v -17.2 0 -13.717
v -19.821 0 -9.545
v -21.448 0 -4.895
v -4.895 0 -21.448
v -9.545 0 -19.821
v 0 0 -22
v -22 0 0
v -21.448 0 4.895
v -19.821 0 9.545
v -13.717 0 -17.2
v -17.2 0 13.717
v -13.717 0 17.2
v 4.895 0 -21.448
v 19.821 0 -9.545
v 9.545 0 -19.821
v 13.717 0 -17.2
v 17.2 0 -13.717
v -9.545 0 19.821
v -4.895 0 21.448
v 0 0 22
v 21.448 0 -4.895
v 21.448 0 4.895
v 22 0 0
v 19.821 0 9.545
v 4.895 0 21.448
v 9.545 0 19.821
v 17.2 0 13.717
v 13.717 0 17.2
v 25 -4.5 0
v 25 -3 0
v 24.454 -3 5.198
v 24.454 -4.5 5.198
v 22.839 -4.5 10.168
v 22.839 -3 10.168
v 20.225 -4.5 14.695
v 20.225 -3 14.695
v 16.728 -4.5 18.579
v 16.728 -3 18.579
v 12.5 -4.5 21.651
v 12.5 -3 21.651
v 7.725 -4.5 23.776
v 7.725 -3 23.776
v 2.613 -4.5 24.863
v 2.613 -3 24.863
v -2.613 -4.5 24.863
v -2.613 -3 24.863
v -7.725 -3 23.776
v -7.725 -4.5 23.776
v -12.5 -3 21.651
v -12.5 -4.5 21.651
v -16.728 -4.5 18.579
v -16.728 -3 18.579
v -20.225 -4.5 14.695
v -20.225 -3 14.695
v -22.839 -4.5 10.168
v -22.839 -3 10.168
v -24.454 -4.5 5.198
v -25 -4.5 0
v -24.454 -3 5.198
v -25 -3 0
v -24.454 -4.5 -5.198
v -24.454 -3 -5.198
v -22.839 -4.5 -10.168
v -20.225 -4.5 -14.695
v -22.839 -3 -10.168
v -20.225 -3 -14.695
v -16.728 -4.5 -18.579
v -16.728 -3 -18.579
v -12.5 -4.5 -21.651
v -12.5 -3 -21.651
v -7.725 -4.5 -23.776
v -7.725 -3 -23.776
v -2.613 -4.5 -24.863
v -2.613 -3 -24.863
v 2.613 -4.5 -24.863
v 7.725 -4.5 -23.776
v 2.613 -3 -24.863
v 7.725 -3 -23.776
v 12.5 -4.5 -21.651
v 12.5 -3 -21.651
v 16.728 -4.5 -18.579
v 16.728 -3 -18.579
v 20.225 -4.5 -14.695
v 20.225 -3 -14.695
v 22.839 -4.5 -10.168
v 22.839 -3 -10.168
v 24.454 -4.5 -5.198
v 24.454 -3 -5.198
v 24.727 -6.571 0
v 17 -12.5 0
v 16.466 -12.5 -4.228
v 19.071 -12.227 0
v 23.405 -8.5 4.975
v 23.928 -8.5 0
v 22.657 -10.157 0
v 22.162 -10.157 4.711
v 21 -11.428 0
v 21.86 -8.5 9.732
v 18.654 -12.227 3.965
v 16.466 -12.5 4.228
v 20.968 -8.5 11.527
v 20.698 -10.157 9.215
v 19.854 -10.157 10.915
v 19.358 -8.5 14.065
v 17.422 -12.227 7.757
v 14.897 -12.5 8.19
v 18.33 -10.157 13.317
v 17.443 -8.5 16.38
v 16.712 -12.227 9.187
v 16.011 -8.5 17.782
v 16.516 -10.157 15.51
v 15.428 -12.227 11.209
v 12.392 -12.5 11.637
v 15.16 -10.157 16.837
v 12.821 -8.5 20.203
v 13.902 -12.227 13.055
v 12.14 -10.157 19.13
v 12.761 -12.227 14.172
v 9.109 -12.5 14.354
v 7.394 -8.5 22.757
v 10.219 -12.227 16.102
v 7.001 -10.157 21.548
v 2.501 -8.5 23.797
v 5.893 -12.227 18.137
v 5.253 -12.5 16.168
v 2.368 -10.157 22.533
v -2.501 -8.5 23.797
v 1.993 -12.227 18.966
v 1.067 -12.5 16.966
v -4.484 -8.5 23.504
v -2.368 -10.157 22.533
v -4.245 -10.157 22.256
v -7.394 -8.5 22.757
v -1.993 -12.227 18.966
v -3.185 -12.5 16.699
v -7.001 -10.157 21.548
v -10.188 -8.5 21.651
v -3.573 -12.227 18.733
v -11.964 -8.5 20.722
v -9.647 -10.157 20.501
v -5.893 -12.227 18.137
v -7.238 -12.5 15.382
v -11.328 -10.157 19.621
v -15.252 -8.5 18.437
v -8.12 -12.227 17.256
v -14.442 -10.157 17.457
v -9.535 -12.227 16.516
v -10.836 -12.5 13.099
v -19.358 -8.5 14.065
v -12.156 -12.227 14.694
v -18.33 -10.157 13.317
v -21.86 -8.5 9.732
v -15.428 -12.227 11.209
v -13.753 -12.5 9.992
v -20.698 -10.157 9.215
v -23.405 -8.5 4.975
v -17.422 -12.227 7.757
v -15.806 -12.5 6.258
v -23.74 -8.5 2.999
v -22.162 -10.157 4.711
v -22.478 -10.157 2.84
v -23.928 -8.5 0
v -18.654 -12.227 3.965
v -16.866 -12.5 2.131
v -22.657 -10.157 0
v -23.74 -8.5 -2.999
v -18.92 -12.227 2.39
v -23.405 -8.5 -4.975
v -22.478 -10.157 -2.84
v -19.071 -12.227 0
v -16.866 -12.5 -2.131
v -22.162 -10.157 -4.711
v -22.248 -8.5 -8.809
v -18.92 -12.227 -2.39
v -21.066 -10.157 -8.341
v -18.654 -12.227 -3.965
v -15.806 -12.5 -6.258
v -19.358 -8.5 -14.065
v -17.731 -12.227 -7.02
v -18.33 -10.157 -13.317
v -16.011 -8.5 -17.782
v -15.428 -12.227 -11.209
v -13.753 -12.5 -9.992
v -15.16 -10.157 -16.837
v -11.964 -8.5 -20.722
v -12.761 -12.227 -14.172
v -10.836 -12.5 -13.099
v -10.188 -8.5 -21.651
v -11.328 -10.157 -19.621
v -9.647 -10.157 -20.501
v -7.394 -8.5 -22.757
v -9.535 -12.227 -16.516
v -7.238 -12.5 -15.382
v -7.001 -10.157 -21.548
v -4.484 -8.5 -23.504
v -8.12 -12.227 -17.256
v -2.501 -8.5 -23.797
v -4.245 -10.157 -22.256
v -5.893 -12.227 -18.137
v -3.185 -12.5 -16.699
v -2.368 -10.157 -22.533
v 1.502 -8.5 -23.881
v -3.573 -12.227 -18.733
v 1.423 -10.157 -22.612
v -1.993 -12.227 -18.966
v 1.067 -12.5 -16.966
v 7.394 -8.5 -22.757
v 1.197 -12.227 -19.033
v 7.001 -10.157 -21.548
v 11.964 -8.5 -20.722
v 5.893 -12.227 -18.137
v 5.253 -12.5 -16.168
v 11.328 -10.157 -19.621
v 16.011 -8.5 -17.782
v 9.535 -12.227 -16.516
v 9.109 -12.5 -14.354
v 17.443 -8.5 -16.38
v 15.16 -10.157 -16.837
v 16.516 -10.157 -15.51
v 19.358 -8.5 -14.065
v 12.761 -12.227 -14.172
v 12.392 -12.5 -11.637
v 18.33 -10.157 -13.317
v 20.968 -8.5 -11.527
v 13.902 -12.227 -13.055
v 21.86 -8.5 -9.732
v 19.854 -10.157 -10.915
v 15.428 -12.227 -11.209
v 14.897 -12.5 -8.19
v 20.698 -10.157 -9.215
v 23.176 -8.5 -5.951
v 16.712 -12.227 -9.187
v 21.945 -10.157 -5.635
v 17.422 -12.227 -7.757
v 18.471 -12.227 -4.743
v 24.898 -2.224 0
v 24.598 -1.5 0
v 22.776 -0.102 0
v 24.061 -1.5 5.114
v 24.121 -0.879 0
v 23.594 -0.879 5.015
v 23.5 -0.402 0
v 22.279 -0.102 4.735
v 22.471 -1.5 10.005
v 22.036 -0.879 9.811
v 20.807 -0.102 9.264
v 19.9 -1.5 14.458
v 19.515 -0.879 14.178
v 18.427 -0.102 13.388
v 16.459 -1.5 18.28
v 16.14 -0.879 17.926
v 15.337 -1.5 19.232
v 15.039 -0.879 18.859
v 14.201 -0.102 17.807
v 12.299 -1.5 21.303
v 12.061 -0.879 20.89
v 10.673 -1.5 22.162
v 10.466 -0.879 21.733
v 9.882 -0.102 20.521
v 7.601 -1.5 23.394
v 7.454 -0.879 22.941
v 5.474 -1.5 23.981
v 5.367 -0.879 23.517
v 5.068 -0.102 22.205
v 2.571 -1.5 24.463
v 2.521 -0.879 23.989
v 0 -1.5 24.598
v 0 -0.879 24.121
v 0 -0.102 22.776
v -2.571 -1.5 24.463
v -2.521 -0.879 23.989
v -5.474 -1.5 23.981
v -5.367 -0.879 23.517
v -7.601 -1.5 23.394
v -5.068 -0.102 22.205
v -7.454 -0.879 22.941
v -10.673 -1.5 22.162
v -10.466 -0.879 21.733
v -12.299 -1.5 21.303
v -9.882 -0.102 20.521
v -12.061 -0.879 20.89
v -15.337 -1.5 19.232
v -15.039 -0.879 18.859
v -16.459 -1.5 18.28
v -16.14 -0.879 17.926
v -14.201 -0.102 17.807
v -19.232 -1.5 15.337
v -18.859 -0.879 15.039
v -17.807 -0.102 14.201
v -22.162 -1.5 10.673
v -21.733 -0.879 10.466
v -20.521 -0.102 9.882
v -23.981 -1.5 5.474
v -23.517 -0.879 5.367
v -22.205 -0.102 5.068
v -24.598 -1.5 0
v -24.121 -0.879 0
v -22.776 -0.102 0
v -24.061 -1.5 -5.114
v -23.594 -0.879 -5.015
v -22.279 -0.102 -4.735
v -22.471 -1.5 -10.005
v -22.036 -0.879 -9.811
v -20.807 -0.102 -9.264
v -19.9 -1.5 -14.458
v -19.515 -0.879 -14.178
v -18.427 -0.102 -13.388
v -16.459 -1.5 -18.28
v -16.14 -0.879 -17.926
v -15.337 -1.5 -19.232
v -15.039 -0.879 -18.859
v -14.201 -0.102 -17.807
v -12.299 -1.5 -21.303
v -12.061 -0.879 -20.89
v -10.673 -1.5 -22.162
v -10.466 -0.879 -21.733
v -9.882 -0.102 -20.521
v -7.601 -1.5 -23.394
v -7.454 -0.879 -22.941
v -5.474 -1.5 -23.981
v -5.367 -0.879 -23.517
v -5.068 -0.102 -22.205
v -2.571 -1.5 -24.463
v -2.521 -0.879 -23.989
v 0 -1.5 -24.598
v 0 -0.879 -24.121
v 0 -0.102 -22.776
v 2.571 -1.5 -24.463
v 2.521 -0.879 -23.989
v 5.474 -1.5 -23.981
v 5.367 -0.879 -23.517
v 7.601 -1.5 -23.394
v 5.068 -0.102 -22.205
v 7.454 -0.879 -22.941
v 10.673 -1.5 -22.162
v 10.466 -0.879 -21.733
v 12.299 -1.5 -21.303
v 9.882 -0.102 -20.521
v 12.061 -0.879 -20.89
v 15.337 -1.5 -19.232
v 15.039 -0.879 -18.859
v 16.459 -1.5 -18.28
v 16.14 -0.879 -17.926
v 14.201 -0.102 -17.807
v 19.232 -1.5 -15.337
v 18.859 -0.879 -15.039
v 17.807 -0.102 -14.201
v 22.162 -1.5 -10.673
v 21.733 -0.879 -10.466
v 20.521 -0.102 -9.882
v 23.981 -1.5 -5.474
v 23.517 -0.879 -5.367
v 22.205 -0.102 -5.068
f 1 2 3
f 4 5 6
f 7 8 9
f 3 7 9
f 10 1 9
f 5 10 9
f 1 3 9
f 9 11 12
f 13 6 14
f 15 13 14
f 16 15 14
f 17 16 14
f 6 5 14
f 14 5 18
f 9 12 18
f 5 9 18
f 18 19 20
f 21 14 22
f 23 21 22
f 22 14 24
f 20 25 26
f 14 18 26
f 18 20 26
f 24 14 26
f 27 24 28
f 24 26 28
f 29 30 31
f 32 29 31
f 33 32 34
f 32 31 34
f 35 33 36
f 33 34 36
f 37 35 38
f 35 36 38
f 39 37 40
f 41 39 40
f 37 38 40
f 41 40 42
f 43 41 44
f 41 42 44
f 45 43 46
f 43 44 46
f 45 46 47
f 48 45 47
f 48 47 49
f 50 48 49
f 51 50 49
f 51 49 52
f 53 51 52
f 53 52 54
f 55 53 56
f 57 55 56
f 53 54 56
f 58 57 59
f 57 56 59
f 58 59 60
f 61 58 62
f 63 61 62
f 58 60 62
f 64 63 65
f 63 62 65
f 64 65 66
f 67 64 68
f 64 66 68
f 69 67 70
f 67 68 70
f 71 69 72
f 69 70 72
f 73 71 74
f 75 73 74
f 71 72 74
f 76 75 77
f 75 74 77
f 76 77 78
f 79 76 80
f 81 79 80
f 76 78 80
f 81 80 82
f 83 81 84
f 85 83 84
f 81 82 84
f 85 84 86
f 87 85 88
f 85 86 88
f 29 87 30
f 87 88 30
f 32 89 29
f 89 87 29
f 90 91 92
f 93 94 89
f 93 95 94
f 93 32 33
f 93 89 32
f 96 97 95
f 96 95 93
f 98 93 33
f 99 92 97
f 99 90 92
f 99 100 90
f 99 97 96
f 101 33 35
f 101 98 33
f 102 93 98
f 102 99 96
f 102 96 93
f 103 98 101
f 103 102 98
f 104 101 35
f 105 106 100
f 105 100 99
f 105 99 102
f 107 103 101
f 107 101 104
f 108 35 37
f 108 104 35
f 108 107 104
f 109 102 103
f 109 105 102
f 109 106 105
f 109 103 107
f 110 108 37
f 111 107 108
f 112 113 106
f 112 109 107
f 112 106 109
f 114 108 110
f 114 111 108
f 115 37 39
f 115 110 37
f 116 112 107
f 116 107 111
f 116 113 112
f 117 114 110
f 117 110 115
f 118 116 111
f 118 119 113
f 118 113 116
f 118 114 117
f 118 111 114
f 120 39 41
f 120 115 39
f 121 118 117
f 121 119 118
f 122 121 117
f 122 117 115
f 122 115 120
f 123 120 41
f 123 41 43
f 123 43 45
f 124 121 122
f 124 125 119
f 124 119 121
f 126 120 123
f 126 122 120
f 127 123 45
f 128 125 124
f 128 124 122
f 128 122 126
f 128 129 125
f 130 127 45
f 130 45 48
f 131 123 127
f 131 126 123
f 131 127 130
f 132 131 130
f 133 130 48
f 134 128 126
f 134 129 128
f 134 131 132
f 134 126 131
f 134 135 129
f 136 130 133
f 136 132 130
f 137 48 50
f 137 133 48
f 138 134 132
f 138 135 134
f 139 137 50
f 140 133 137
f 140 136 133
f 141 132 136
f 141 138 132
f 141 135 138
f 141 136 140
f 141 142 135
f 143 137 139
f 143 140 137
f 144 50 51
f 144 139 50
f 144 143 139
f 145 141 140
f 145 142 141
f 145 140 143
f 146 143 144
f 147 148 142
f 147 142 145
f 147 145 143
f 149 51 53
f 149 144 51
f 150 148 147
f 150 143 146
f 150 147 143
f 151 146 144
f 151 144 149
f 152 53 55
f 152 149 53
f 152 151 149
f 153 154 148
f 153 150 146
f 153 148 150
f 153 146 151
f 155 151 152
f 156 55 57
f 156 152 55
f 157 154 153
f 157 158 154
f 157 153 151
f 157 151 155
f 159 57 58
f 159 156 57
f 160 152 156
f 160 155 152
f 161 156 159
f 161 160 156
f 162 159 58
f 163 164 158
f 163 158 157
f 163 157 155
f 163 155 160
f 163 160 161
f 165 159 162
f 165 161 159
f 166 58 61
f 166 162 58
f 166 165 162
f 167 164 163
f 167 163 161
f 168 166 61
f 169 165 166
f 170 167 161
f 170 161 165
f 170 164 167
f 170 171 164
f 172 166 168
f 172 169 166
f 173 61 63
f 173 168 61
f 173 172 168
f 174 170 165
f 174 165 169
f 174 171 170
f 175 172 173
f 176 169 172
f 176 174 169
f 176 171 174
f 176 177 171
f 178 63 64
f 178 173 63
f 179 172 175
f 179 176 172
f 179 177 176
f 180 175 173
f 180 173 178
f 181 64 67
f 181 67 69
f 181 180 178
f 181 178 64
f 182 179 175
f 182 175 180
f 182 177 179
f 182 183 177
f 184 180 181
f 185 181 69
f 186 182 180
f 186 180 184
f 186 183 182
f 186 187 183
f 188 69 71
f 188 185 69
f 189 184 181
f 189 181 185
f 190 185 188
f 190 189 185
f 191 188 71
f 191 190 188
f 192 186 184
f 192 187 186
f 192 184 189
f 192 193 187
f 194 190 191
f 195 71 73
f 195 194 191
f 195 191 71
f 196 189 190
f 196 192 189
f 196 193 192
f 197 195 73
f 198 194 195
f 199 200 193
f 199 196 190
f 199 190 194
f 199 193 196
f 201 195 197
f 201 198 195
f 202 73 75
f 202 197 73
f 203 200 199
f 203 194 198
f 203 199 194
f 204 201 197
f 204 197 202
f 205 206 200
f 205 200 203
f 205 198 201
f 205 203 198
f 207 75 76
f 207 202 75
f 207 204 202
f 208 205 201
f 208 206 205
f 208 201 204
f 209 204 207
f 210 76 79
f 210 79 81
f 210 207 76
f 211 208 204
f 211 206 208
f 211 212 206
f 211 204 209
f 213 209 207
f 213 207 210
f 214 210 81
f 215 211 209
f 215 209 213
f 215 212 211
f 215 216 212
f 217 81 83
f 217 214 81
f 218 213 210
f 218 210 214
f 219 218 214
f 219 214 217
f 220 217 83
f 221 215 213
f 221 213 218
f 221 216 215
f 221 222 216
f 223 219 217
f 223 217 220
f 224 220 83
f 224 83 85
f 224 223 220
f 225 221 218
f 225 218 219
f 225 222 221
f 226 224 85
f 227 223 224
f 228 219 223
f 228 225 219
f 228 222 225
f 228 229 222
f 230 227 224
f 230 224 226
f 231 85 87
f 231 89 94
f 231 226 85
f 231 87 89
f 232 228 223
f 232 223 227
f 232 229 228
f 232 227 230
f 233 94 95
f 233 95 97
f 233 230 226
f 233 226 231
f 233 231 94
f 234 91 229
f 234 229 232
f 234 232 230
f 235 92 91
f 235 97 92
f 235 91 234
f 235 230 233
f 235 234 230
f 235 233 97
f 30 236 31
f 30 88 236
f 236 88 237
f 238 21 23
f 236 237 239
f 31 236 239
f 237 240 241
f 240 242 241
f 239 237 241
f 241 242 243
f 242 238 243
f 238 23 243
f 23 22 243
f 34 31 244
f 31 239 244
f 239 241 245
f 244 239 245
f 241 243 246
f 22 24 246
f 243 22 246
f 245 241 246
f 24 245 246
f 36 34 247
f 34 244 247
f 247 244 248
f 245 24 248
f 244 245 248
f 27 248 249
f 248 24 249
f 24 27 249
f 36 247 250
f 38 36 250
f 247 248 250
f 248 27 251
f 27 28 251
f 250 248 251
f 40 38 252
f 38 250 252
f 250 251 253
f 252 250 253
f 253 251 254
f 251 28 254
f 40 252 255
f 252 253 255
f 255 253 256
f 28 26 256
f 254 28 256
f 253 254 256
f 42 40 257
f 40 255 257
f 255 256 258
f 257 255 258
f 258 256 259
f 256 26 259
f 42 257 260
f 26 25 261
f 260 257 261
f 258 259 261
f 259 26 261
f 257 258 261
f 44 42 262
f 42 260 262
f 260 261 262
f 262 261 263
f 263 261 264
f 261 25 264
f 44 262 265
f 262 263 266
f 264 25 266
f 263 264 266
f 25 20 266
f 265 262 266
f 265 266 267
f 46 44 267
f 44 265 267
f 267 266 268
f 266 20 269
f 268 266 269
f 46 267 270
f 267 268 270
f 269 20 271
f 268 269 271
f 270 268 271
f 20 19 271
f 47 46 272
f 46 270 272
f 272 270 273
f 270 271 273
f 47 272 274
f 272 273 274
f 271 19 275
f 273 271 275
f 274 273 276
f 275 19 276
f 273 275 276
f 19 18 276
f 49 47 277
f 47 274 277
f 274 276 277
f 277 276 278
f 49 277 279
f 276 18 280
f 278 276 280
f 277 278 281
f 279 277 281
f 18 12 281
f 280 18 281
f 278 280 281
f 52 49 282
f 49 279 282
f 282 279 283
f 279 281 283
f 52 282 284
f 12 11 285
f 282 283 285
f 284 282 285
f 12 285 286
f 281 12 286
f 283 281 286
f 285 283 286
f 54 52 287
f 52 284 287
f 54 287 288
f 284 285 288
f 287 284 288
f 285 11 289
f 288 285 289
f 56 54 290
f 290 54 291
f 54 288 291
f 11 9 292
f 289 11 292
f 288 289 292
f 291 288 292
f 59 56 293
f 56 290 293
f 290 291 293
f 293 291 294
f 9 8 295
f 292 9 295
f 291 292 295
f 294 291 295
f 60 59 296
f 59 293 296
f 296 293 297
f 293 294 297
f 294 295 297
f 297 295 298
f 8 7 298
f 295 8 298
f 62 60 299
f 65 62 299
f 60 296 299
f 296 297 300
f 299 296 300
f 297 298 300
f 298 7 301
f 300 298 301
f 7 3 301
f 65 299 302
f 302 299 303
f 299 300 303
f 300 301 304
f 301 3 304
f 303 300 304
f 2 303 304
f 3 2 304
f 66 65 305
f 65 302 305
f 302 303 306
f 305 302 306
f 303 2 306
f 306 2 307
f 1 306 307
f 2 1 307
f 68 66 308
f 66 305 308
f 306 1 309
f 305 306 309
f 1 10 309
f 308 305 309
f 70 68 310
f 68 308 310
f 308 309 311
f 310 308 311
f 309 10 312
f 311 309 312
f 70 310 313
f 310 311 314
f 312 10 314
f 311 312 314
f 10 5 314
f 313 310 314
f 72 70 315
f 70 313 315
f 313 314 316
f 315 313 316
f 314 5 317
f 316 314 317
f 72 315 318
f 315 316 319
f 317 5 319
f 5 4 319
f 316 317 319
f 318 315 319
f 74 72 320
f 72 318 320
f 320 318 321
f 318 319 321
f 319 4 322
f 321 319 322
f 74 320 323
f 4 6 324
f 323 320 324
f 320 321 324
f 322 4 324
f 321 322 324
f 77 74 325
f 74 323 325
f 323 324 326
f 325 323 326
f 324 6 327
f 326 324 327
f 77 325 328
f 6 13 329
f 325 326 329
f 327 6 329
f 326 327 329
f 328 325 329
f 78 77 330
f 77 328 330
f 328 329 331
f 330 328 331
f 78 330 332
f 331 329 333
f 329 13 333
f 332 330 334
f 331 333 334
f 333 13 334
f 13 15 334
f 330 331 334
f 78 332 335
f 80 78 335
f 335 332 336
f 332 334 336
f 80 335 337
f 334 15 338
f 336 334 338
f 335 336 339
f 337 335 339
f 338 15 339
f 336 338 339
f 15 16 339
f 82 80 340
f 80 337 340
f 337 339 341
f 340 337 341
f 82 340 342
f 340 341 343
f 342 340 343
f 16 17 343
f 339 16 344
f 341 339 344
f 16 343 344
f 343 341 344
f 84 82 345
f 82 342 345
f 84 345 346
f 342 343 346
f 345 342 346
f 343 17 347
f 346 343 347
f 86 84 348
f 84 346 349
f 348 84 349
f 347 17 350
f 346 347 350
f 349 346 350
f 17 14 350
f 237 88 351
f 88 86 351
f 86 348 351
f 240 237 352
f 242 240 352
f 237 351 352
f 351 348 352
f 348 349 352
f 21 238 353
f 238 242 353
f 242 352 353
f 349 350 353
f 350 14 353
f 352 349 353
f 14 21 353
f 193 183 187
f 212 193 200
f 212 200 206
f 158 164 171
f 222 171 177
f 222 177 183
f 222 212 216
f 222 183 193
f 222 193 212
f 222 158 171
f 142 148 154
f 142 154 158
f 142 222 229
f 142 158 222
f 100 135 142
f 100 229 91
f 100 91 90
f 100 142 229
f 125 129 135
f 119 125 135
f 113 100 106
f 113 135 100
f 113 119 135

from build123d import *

# Parameters (mm, degrees)
CYLINDER006_R     = 25
CYLINDER006_DEPTH = 12.5
FILLET007_1_R     = 8
FILLET007_2_R     = 3


with BuildPart() as part:
    # Cylinder006 → Cylinder006 (new body)
    with BuildSketch(Plane.XZ):
        Circle(CYLINDER006_R)
    extrude(amount=CYLINDER006_DEPTH)

    # Fillet007 1
    fillet007_1_edges = [part.edges().sort_by_distance(p)[0] for p in [
        (-25, -12.5, 0),
    ]]
    fillet(fillet007_1_edges, radius=FILLET007_1_R)

    # Fillet007 2
    fillet007_2_edges = [part.edges().sort_by_distance(p)[0] for p in [
        (-25, 0, 0),
    ]]
    fillet(fillet007_2_edges, radius=FILLET007_2_R)


solid = part.part
